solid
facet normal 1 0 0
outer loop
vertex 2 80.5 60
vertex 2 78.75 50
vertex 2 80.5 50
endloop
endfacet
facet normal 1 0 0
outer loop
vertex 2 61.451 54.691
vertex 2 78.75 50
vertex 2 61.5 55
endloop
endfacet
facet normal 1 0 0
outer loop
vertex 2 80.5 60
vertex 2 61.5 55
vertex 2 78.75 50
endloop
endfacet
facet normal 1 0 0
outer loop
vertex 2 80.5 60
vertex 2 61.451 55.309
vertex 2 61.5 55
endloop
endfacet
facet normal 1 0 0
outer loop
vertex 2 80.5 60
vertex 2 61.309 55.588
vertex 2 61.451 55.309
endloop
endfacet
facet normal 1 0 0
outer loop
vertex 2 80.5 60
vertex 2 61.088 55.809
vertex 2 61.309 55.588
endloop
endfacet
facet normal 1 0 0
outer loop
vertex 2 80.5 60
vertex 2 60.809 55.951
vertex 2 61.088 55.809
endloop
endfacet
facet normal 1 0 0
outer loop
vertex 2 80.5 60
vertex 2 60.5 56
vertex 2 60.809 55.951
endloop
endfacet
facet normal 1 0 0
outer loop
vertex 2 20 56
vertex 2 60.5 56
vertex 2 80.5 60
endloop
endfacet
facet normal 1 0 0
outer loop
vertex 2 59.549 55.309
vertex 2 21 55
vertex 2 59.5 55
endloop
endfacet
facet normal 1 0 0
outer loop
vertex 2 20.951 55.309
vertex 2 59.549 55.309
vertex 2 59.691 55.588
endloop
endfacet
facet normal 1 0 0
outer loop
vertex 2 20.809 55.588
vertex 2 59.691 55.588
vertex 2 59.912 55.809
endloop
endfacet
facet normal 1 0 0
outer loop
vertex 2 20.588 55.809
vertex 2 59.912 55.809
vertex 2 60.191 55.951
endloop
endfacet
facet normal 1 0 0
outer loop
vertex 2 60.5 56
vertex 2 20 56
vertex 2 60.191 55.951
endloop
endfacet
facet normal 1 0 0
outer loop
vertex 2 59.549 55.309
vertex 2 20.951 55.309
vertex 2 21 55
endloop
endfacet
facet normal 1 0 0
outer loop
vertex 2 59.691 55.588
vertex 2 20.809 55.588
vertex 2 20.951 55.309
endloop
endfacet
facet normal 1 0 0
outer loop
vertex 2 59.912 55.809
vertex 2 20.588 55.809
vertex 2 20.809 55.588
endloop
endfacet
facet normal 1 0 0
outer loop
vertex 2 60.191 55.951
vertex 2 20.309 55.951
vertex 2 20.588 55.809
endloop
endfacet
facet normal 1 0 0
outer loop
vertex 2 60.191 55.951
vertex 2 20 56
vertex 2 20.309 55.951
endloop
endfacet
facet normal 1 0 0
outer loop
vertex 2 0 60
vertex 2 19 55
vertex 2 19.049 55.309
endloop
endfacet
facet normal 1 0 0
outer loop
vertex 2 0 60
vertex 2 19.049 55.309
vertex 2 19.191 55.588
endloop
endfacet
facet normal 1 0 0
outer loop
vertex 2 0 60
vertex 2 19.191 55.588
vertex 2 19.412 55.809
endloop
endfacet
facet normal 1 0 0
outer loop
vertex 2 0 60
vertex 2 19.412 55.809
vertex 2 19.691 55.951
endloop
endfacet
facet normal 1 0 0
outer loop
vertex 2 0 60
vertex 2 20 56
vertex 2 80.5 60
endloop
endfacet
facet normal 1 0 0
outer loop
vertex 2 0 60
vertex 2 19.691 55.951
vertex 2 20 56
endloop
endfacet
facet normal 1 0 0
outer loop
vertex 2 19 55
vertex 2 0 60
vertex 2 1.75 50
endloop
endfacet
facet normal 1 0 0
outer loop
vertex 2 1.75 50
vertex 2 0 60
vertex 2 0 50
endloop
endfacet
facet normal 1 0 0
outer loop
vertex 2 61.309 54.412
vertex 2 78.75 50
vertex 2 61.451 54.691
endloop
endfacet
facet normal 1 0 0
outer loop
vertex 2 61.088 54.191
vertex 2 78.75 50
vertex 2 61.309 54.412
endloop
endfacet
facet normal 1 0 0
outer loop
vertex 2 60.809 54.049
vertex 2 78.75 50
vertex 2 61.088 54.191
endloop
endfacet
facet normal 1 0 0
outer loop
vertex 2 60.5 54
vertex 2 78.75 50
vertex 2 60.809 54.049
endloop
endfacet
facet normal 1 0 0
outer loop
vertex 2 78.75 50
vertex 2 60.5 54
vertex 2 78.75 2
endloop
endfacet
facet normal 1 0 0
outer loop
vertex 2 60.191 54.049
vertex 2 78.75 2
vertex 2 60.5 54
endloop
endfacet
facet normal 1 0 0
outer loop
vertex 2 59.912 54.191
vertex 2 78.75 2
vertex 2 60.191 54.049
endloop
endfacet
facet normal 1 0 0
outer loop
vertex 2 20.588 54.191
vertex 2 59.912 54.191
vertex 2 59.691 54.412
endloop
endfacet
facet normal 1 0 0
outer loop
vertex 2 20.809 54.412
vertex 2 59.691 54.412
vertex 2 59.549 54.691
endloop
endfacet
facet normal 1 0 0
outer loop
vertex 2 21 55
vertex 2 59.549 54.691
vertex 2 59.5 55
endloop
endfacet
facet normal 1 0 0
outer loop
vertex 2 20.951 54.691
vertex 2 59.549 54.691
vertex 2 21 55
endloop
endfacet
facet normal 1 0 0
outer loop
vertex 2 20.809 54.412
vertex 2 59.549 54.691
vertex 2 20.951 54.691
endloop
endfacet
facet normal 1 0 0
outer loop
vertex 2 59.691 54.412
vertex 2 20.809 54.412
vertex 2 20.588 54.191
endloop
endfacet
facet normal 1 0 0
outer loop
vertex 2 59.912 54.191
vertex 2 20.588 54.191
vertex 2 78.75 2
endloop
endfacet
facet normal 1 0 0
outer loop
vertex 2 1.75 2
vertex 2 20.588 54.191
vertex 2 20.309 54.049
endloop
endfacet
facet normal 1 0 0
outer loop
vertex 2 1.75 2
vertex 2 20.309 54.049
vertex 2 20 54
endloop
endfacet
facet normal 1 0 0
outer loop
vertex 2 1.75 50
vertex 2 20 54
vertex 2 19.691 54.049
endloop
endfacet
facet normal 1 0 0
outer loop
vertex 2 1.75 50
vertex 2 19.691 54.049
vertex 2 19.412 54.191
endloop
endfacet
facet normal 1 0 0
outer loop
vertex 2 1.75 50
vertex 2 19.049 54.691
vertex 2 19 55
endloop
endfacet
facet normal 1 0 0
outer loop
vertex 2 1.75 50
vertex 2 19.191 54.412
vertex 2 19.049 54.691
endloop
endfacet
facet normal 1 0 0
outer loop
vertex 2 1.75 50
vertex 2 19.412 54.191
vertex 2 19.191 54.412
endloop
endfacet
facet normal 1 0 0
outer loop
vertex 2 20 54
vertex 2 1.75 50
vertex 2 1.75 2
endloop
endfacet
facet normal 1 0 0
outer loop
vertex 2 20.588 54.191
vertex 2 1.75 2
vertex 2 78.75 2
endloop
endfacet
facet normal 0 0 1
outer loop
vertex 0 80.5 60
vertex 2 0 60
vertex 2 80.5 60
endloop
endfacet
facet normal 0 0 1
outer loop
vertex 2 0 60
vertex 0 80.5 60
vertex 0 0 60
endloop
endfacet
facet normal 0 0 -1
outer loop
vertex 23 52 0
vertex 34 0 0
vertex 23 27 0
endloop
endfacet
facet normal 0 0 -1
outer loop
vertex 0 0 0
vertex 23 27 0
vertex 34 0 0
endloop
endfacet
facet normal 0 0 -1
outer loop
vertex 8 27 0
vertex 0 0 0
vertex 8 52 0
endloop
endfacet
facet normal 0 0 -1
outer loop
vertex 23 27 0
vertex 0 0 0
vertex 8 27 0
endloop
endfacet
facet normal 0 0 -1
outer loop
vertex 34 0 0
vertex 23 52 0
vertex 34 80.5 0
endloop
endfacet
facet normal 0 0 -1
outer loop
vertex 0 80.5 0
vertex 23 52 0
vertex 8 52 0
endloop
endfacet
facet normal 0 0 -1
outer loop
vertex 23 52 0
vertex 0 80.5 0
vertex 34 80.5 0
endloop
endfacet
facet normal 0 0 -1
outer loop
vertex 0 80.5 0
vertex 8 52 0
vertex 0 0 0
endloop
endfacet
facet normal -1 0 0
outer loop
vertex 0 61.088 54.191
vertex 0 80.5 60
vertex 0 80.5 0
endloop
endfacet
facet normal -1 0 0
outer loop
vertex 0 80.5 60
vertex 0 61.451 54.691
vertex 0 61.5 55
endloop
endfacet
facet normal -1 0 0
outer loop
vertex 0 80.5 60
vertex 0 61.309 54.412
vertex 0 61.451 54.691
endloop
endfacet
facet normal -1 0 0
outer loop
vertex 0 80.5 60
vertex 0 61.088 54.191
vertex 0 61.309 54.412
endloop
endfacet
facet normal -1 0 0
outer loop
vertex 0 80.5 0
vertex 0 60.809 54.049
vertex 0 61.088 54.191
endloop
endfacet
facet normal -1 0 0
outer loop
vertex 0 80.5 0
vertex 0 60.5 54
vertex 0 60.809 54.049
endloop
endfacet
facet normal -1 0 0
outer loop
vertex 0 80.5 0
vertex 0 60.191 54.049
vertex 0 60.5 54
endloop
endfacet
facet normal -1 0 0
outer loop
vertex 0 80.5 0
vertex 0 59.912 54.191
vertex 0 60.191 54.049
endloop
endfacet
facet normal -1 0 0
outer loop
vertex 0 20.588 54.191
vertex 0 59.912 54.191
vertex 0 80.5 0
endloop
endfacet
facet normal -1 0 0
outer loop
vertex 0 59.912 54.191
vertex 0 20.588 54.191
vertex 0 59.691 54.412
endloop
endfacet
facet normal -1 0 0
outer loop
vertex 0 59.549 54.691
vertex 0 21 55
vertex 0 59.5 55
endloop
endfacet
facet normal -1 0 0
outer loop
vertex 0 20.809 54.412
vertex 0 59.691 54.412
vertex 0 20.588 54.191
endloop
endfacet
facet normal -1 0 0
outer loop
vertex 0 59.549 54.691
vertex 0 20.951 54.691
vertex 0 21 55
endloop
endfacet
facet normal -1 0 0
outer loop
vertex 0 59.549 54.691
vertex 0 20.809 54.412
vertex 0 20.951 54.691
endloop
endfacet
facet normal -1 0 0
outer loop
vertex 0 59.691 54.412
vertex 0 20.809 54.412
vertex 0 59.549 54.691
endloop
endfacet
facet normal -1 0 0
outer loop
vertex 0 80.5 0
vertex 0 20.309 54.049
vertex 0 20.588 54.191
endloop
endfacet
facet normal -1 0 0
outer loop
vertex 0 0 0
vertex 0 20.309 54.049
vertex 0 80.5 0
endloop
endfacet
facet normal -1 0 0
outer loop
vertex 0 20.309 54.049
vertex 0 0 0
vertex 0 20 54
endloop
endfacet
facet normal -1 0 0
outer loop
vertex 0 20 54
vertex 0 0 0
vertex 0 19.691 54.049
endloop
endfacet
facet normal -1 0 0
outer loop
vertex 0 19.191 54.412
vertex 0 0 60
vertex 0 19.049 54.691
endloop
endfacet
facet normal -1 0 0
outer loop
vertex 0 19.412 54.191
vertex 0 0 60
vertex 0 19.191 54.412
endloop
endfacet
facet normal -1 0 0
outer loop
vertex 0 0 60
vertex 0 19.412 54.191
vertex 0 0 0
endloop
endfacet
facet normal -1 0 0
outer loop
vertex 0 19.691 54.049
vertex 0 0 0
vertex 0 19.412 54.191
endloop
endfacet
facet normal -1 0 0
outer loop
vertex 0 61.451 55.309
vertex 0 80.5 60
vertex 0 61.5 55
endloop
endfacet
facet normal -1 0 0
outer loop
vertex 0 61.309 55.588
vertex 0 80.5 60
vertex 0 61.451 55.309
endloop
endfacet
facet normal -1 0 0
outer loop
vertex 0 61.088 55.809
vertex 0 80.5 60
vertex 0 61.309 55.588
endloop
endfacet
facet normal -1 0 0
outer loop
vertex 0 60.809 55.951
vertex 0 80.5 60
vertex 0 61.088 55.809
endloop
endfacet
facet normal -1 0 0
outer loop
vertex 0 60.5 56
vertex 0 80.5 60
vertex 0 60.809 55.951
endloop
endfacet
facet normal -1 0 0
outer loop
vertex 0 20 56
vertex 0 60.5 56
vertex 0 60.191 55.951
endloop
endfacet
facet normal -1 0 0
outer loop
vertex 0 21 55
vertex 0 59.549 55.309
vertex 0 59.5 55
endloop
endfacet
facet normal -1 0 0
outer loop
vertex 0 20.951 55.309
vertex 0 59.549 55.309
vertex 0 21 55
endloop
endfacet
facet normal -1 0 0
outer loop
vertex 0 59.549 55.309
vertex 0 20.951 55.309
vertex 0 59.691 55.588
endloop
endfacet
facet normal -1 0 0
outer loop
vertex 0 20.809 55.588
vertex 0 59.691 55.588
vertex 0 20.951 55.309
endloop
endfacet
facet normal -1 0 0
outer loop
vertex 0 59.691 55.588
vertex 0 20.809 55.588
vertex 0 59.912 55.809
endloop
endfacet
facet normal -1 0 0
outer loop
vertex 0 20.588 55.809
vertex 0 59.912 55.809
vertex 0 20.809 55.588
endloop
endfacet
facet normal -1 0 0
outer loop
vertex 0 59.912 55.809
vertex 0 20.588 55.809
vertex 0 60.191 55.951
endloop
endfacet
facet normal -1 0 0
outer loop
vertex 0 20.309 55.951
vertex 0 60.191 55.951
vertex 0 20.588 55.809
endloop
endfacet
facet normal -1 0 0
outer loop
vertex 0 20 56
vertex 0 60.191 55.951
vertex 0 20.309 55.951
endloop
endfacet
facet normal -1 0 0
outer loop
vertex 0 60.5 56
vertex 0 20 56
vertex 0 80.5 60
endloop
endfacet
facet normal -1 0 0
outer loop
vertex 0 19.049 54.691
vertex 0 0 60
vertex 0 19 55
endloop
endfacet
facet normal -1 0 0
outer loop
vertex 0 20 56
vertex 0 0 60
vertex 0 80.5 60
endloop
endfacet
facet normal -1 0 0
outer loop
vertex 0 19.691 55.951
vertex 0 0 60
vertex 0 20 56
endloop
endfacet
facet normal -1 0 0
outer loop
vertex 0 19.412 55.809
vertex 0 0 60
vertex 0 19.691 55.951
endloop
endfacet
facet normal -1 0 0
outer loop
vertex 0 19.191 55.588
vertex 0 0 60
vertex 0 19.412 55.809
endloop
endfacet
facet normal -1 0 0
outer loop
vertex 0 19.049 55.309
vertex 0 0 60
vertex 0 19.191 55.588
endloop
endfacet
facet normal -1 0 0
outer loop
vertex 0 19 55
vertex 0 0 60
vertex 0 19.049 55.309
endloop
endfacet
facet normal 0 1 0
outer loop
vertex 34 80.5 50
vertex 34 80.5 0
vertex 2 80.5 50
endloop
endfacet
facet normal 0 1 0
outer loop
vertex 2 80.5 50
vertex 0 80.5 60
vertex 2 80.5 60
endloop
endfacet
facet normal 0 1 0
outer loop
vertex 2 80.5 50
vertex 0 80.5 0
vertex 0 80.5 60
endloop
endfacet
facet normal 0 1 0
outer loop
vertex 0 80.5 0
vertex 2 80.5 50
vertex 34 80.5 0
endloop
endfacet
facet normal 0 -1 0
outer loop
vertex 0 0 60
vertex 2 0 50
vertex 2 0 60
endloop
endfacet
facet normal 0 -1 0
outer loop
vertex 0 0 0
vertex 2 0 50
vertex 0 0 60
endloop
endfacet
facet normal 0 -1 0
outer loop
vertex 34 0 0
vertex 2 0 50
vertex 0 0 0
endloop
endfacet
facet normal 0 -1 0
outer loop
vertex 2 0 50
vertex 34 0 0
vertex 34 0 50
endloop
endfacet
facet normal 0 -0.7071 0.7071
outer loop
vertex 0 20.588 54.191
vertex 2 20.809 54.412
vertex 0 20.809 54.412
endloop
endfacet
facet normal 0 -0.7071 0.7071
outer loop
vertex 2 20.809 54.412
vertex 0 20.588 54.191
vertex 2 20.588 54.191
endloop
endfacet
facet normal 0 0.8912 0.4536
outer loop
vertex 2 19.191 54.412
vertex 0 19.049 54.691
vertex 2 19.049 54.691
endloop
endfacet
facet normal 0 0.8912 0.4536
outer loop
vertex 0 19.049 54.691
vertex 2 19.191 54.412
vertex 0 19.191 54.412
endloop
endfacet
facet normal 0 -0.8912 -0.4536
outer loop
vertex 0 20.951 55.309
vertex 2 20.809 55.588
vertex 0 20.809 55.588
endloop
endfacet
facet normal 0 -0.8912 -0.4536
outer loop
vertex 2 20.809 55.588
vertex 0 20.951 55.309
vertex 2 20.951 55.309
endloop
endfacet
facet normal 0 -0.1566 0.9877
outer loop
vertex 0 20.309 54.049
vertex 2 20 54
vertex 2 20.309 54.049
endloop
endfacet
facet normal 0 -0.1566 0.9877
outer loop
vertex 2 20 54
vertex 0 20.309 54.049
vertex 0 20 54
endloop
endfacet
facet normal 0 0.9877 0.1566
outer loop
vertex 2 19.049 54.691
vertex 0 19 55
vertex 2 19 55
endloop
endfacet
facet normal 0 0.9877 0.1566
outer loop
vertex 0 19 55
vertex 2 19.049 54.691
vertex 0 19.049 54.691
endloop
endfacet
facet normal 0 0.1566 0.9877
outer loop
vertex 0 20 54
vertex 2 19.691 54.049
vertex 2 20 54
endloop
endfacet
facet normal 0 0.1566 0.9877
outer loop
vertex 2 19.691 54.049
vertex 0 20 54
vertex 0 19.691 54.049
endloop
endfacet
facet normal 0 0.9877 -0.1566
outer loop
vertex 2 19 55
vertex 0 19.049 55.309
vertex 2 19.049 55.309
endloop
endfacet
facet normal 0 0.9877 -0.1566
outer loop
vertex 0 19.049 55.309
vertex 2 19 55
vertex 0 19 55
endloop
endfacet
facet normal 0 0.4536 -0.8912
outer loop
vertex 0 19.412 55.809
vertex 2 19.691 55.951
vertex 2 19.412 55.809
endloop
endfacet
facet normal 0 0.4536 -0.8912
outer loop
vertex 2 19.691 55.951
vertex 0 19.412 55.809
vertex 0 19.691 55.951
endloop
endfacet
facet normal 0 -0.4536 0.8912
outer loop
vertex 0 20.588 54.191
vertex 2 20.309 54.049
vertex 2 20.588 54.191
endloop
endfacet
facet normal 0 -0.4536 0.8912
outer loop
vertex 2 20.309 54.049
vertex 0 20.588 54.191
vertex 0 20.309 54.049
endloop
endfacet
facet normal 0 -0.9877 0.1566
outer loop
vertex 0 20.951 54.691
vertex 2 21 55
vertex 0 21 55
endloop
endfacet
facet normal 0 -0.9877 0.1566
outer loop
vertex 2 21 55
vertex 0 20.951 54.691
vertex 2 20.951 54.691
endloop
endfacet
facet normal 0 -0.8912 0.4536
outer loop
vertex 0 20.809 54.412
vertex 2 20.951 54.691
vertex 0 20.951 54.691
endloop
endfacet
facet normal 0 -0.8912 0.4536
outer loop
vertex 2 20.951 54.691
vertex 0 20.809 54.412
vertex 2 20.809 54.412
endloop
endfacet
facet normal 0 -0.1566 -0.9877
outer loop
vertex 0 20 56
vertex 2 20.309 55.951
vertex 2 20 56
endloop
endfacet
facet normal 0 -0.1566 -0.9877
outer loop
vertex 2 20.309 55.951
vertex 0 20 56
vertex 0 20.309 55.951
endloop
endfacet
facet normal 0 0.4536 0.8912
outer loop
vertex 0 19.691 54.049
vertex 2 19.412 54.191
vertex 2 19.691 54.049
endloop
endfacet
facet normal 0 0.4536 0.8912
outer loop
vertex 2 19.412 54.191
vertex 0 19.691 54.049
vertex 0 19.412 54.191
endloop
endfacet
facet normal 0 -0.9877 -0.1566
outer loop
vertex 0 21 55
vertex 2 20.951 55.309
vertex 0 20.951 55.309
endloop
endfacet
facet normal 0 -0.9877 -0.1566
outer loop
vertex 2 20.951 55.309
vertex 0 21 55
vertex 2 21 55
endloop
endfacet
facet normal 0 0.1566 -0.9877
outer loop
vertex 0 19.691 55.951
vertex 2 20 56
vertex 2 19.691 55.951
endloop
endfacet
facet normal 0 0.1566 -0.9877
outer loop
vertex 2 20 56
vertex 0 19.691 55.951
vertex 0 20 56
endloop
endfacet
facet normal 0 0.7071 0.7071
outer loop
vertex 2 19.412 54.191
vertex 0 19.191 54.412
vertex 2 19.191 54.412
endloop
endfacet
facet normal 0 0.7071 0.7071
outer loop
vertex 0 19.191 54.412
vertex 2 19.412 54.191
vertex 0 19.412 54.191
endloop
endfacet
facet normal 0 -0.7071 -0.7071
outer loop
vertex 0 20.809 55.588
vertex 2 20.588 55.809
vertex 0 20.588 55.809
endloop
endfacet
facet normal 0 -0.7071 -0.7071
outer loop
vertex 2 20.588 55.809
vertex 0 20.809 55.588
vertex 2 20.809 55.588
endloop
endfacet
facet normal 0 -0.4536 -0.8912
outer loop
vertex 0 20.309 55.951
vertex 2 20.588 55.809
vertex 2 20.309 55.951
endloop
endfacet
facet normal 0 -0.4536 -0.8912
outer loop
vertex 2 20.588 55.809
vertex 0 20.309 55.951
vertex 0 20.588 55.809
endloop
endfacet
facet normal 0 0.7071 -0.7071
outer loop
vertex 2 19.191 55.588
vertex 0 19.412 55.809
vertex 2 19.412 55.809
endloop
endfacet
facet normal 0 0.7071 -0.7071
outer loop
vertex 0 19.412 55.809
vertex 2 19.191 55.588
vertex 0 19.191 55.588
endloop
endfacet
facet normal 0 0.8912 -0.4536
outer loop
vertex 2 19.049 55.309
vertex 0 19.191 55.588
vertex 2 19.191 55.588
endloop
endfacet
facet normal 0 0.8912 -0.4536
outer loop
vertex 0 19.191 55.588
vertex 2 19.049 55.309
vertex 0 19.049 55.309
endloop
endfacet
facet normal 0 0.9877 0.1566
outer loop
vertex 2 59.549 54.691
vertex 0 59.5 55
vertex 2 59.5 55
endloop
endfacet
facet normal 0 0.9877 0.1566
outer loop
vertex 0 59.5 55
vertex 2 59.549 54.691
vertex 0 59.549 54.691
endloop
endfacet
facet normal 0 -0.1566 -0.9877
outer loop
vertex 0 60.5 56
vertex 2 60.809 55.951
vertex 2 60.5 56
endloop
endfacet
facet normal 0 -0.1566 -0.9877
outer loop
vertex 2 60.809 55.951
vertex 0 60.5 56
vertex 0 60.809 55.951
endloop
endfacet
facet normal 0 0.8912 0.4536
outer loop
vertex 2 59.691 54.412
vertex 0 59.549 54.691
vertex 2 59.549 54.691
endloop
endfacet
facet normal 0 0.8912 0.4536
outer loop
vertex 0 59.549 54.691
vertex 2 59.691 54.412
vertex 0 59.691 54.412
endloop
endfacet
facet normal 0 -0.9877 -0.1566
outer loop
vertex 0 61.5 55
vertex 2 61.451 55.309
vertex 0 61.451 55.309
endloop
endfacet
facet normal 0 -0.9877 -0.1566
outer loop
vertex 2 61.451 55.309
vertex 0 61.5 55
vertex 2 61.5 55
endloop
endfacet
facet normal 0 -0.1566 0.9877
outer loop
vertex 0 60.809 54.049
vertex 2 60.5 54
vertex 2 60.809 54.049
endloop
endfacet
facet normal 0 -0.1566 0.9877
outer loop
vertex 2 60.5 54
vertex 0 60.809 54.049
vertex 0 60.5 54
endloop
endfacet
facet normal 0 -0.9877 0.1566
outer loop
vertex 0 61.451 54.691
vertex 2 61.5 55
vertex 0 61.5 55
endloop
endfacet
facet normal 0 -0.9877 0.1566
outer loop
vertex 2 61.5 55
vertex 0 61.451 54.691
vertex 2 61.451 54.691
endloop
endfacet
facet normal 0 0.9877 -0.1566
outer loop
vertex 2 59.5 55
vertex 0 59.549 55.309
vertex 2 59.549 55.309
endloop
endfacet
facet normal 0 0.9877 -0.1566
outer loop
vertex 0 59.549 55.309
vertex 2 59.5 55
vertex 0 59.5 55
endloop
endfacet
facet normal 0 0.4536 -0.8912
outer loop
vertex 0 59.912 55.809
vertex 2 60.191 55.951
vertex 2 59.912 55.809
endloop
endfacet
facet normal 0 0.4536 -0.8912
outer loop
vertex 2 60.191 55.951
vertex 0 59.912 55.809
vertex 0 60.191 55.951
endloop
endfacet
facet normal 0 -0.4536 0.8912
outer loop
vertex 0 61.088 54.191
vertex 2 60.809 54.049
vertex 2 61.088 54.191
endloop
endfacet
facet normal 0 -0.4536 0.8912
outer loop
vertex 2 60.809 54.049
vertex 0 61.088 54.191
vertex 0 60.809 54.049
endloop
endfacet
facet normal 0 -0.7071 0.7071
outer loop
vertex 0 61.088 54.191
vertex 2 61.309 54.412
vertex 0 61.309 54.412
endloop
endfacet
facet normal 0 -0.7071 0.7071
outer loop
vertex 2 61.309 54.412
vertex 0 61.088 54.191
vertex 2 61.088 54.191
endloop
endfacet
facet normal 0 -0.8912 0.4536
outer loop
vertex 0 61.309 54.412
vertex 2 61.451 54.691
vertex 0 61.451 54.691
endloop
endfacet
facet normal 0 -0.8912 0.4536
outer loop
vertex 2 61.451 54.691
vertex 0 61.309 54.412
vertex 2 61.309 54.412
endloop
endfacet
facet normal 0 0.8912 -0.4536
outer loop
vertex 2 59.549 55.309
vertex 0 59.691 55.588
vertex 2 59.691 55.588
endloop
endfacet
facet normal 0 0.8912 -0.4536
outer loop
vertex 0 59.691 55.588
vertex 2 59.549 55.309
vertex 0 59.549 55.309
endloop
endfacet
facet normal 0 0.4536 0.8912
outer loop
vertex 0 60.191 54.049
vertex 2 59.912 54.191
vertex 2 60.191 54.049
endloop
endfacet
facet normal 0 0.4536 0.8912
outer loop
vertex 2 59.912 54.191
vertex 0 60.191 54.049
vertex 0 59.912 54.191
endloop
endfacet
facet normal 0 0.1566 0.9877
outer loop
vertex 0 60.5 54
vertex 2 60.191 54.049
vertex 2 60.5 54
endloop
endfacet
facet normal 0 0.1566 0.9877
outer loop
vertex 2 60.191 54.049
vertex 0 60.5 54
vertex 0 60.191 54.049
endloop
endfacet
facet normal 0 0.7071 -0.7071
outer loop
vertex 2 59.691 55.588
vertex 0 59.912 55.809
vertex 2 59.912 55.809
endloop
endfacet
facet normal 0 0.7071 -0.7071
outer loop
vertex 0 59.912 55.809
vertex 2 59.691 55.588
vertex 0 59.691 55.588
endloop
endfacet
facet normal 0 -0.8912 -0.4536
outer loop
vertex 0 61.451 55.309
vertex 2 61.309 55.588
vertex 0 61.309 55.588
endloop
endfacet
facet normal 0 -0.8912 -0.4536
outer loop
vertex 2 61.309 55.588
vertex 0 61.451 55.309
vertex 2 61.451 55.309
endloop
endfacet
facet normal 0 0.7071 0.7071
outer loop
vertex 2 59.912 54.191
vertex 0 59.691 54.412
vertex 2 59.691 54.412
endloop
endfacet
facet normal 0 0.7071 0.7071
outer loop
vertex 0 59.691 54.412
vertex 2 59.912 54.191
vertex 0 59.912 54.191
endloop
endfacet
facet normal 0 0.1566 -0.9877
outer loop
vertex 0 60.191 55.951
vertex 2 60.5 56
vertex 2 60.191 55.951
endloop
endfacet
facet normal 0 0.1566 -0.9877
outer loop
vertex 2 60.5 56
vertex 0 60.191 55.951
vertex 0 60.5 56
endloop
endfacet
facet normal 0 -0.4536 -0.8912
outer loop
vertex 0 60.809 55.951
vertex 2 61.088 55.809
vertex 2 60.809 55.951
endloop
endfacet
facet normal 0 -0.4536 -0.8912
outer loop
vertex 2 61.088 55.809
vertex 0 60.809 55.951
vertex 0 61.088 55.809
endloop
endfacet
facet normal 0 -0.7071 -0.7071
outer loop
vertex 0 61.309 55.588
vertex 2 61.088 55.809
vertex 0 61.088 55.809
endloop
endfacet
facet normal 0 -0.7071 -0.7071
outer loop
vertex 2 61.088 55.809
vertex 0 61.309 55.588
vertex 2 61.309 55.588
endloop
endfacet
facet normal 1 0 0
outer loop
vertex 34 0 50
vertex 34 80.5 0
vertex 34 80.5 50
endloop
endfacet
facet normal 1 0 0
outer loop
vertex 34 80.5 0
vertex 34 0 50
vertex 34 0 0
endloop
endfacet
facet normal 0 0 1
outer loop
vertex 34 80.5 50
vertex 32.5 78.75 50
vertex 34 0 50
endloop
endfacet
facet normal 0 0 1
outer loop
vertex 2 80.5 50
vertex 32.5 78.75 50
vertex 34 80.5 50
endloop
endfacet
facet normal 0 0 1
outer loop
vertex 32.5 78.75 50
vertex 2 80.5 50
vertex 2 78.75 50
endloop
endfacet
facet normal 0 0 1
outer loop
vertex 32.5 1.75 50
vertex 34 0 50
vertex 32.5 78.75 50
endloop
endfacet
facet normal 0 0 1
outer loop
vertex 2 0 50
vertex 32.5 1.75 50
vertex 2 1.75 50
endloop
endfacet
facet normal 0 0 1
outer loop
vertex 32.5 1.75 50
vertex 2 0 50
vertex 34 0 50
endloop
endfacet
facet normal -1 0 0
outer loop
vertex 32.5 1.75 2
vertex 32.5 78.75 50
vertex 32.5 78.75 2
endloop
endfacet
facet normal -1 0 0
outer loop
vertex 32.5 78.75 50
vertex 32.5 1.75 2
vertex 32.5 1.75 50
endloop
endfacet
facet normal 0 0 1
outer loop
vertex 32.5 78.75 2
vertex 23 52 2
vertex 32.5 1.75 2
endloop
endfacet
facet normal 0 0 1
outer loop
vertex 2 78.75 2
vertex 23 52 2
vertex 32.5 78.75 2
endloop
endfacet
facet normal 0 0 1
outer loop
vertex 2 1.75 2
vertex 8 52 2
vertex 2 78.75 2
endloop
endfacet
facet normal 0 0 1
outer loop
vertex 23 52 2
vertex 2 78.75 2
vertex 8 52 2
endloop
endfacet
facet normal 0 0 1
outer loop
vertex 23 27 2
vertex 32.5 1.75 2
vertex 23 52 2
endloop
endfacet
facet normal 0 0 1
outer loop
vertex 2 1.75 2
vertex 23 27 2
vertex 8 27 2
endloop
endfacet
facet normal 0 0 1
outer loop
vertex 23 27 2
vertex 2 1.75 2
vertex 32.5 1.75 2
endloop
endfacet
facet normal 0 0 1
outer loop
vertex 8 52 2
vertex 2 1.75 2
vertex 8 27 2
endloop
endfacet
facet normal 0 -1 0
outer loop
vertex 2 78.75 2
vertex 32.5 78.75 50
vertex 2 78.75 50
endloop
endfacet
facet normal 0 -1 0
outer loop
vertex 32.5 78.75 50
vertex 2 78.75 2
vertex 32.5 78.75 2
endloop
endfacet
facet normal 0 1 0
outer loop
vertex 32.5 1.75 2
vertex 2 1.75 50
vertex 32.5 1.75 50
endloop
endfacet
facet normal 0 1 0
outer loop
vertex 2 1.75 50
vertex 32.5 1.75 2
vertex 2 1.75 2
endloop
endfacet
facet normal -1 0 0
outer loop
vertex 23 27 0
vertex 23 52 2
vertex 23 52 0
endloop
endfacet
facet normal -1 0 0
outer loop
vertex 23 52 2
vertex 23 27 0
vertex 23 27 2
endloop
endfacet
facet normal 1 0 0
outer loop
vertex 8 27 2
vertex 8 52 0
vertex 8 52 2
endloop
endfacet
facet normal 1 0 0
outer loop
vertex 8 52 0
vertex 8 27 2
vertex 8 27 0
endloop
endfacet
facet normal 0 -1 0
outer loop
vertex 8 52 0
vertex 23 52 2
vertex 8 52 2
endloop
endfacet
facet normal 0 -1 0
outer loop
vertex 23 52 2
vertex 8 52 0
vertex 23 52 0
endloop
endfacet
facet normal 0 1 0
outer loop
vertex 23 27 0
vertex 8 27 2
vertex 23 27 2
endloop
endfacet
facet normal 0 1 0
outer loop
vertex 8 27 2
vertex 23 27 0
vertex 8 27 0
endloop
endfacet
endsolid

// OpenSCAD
$fn=20;
difference(){
    cube([2,80.5,60]);
    
translate([0,20,55])
rotate([0,90,0])
cylinder(d=2,h=4);   
   
   translate([0,80.5-20,55])
rotate([0,90,0])
cylinder(d=2,h=4); 
}


difference(){
cube([34,80.5,50]);
    translate([2,2-.25,2])
cube([30.5,77,50]);
    
    translate([8,27])
    cube([15,25,5]);
}
